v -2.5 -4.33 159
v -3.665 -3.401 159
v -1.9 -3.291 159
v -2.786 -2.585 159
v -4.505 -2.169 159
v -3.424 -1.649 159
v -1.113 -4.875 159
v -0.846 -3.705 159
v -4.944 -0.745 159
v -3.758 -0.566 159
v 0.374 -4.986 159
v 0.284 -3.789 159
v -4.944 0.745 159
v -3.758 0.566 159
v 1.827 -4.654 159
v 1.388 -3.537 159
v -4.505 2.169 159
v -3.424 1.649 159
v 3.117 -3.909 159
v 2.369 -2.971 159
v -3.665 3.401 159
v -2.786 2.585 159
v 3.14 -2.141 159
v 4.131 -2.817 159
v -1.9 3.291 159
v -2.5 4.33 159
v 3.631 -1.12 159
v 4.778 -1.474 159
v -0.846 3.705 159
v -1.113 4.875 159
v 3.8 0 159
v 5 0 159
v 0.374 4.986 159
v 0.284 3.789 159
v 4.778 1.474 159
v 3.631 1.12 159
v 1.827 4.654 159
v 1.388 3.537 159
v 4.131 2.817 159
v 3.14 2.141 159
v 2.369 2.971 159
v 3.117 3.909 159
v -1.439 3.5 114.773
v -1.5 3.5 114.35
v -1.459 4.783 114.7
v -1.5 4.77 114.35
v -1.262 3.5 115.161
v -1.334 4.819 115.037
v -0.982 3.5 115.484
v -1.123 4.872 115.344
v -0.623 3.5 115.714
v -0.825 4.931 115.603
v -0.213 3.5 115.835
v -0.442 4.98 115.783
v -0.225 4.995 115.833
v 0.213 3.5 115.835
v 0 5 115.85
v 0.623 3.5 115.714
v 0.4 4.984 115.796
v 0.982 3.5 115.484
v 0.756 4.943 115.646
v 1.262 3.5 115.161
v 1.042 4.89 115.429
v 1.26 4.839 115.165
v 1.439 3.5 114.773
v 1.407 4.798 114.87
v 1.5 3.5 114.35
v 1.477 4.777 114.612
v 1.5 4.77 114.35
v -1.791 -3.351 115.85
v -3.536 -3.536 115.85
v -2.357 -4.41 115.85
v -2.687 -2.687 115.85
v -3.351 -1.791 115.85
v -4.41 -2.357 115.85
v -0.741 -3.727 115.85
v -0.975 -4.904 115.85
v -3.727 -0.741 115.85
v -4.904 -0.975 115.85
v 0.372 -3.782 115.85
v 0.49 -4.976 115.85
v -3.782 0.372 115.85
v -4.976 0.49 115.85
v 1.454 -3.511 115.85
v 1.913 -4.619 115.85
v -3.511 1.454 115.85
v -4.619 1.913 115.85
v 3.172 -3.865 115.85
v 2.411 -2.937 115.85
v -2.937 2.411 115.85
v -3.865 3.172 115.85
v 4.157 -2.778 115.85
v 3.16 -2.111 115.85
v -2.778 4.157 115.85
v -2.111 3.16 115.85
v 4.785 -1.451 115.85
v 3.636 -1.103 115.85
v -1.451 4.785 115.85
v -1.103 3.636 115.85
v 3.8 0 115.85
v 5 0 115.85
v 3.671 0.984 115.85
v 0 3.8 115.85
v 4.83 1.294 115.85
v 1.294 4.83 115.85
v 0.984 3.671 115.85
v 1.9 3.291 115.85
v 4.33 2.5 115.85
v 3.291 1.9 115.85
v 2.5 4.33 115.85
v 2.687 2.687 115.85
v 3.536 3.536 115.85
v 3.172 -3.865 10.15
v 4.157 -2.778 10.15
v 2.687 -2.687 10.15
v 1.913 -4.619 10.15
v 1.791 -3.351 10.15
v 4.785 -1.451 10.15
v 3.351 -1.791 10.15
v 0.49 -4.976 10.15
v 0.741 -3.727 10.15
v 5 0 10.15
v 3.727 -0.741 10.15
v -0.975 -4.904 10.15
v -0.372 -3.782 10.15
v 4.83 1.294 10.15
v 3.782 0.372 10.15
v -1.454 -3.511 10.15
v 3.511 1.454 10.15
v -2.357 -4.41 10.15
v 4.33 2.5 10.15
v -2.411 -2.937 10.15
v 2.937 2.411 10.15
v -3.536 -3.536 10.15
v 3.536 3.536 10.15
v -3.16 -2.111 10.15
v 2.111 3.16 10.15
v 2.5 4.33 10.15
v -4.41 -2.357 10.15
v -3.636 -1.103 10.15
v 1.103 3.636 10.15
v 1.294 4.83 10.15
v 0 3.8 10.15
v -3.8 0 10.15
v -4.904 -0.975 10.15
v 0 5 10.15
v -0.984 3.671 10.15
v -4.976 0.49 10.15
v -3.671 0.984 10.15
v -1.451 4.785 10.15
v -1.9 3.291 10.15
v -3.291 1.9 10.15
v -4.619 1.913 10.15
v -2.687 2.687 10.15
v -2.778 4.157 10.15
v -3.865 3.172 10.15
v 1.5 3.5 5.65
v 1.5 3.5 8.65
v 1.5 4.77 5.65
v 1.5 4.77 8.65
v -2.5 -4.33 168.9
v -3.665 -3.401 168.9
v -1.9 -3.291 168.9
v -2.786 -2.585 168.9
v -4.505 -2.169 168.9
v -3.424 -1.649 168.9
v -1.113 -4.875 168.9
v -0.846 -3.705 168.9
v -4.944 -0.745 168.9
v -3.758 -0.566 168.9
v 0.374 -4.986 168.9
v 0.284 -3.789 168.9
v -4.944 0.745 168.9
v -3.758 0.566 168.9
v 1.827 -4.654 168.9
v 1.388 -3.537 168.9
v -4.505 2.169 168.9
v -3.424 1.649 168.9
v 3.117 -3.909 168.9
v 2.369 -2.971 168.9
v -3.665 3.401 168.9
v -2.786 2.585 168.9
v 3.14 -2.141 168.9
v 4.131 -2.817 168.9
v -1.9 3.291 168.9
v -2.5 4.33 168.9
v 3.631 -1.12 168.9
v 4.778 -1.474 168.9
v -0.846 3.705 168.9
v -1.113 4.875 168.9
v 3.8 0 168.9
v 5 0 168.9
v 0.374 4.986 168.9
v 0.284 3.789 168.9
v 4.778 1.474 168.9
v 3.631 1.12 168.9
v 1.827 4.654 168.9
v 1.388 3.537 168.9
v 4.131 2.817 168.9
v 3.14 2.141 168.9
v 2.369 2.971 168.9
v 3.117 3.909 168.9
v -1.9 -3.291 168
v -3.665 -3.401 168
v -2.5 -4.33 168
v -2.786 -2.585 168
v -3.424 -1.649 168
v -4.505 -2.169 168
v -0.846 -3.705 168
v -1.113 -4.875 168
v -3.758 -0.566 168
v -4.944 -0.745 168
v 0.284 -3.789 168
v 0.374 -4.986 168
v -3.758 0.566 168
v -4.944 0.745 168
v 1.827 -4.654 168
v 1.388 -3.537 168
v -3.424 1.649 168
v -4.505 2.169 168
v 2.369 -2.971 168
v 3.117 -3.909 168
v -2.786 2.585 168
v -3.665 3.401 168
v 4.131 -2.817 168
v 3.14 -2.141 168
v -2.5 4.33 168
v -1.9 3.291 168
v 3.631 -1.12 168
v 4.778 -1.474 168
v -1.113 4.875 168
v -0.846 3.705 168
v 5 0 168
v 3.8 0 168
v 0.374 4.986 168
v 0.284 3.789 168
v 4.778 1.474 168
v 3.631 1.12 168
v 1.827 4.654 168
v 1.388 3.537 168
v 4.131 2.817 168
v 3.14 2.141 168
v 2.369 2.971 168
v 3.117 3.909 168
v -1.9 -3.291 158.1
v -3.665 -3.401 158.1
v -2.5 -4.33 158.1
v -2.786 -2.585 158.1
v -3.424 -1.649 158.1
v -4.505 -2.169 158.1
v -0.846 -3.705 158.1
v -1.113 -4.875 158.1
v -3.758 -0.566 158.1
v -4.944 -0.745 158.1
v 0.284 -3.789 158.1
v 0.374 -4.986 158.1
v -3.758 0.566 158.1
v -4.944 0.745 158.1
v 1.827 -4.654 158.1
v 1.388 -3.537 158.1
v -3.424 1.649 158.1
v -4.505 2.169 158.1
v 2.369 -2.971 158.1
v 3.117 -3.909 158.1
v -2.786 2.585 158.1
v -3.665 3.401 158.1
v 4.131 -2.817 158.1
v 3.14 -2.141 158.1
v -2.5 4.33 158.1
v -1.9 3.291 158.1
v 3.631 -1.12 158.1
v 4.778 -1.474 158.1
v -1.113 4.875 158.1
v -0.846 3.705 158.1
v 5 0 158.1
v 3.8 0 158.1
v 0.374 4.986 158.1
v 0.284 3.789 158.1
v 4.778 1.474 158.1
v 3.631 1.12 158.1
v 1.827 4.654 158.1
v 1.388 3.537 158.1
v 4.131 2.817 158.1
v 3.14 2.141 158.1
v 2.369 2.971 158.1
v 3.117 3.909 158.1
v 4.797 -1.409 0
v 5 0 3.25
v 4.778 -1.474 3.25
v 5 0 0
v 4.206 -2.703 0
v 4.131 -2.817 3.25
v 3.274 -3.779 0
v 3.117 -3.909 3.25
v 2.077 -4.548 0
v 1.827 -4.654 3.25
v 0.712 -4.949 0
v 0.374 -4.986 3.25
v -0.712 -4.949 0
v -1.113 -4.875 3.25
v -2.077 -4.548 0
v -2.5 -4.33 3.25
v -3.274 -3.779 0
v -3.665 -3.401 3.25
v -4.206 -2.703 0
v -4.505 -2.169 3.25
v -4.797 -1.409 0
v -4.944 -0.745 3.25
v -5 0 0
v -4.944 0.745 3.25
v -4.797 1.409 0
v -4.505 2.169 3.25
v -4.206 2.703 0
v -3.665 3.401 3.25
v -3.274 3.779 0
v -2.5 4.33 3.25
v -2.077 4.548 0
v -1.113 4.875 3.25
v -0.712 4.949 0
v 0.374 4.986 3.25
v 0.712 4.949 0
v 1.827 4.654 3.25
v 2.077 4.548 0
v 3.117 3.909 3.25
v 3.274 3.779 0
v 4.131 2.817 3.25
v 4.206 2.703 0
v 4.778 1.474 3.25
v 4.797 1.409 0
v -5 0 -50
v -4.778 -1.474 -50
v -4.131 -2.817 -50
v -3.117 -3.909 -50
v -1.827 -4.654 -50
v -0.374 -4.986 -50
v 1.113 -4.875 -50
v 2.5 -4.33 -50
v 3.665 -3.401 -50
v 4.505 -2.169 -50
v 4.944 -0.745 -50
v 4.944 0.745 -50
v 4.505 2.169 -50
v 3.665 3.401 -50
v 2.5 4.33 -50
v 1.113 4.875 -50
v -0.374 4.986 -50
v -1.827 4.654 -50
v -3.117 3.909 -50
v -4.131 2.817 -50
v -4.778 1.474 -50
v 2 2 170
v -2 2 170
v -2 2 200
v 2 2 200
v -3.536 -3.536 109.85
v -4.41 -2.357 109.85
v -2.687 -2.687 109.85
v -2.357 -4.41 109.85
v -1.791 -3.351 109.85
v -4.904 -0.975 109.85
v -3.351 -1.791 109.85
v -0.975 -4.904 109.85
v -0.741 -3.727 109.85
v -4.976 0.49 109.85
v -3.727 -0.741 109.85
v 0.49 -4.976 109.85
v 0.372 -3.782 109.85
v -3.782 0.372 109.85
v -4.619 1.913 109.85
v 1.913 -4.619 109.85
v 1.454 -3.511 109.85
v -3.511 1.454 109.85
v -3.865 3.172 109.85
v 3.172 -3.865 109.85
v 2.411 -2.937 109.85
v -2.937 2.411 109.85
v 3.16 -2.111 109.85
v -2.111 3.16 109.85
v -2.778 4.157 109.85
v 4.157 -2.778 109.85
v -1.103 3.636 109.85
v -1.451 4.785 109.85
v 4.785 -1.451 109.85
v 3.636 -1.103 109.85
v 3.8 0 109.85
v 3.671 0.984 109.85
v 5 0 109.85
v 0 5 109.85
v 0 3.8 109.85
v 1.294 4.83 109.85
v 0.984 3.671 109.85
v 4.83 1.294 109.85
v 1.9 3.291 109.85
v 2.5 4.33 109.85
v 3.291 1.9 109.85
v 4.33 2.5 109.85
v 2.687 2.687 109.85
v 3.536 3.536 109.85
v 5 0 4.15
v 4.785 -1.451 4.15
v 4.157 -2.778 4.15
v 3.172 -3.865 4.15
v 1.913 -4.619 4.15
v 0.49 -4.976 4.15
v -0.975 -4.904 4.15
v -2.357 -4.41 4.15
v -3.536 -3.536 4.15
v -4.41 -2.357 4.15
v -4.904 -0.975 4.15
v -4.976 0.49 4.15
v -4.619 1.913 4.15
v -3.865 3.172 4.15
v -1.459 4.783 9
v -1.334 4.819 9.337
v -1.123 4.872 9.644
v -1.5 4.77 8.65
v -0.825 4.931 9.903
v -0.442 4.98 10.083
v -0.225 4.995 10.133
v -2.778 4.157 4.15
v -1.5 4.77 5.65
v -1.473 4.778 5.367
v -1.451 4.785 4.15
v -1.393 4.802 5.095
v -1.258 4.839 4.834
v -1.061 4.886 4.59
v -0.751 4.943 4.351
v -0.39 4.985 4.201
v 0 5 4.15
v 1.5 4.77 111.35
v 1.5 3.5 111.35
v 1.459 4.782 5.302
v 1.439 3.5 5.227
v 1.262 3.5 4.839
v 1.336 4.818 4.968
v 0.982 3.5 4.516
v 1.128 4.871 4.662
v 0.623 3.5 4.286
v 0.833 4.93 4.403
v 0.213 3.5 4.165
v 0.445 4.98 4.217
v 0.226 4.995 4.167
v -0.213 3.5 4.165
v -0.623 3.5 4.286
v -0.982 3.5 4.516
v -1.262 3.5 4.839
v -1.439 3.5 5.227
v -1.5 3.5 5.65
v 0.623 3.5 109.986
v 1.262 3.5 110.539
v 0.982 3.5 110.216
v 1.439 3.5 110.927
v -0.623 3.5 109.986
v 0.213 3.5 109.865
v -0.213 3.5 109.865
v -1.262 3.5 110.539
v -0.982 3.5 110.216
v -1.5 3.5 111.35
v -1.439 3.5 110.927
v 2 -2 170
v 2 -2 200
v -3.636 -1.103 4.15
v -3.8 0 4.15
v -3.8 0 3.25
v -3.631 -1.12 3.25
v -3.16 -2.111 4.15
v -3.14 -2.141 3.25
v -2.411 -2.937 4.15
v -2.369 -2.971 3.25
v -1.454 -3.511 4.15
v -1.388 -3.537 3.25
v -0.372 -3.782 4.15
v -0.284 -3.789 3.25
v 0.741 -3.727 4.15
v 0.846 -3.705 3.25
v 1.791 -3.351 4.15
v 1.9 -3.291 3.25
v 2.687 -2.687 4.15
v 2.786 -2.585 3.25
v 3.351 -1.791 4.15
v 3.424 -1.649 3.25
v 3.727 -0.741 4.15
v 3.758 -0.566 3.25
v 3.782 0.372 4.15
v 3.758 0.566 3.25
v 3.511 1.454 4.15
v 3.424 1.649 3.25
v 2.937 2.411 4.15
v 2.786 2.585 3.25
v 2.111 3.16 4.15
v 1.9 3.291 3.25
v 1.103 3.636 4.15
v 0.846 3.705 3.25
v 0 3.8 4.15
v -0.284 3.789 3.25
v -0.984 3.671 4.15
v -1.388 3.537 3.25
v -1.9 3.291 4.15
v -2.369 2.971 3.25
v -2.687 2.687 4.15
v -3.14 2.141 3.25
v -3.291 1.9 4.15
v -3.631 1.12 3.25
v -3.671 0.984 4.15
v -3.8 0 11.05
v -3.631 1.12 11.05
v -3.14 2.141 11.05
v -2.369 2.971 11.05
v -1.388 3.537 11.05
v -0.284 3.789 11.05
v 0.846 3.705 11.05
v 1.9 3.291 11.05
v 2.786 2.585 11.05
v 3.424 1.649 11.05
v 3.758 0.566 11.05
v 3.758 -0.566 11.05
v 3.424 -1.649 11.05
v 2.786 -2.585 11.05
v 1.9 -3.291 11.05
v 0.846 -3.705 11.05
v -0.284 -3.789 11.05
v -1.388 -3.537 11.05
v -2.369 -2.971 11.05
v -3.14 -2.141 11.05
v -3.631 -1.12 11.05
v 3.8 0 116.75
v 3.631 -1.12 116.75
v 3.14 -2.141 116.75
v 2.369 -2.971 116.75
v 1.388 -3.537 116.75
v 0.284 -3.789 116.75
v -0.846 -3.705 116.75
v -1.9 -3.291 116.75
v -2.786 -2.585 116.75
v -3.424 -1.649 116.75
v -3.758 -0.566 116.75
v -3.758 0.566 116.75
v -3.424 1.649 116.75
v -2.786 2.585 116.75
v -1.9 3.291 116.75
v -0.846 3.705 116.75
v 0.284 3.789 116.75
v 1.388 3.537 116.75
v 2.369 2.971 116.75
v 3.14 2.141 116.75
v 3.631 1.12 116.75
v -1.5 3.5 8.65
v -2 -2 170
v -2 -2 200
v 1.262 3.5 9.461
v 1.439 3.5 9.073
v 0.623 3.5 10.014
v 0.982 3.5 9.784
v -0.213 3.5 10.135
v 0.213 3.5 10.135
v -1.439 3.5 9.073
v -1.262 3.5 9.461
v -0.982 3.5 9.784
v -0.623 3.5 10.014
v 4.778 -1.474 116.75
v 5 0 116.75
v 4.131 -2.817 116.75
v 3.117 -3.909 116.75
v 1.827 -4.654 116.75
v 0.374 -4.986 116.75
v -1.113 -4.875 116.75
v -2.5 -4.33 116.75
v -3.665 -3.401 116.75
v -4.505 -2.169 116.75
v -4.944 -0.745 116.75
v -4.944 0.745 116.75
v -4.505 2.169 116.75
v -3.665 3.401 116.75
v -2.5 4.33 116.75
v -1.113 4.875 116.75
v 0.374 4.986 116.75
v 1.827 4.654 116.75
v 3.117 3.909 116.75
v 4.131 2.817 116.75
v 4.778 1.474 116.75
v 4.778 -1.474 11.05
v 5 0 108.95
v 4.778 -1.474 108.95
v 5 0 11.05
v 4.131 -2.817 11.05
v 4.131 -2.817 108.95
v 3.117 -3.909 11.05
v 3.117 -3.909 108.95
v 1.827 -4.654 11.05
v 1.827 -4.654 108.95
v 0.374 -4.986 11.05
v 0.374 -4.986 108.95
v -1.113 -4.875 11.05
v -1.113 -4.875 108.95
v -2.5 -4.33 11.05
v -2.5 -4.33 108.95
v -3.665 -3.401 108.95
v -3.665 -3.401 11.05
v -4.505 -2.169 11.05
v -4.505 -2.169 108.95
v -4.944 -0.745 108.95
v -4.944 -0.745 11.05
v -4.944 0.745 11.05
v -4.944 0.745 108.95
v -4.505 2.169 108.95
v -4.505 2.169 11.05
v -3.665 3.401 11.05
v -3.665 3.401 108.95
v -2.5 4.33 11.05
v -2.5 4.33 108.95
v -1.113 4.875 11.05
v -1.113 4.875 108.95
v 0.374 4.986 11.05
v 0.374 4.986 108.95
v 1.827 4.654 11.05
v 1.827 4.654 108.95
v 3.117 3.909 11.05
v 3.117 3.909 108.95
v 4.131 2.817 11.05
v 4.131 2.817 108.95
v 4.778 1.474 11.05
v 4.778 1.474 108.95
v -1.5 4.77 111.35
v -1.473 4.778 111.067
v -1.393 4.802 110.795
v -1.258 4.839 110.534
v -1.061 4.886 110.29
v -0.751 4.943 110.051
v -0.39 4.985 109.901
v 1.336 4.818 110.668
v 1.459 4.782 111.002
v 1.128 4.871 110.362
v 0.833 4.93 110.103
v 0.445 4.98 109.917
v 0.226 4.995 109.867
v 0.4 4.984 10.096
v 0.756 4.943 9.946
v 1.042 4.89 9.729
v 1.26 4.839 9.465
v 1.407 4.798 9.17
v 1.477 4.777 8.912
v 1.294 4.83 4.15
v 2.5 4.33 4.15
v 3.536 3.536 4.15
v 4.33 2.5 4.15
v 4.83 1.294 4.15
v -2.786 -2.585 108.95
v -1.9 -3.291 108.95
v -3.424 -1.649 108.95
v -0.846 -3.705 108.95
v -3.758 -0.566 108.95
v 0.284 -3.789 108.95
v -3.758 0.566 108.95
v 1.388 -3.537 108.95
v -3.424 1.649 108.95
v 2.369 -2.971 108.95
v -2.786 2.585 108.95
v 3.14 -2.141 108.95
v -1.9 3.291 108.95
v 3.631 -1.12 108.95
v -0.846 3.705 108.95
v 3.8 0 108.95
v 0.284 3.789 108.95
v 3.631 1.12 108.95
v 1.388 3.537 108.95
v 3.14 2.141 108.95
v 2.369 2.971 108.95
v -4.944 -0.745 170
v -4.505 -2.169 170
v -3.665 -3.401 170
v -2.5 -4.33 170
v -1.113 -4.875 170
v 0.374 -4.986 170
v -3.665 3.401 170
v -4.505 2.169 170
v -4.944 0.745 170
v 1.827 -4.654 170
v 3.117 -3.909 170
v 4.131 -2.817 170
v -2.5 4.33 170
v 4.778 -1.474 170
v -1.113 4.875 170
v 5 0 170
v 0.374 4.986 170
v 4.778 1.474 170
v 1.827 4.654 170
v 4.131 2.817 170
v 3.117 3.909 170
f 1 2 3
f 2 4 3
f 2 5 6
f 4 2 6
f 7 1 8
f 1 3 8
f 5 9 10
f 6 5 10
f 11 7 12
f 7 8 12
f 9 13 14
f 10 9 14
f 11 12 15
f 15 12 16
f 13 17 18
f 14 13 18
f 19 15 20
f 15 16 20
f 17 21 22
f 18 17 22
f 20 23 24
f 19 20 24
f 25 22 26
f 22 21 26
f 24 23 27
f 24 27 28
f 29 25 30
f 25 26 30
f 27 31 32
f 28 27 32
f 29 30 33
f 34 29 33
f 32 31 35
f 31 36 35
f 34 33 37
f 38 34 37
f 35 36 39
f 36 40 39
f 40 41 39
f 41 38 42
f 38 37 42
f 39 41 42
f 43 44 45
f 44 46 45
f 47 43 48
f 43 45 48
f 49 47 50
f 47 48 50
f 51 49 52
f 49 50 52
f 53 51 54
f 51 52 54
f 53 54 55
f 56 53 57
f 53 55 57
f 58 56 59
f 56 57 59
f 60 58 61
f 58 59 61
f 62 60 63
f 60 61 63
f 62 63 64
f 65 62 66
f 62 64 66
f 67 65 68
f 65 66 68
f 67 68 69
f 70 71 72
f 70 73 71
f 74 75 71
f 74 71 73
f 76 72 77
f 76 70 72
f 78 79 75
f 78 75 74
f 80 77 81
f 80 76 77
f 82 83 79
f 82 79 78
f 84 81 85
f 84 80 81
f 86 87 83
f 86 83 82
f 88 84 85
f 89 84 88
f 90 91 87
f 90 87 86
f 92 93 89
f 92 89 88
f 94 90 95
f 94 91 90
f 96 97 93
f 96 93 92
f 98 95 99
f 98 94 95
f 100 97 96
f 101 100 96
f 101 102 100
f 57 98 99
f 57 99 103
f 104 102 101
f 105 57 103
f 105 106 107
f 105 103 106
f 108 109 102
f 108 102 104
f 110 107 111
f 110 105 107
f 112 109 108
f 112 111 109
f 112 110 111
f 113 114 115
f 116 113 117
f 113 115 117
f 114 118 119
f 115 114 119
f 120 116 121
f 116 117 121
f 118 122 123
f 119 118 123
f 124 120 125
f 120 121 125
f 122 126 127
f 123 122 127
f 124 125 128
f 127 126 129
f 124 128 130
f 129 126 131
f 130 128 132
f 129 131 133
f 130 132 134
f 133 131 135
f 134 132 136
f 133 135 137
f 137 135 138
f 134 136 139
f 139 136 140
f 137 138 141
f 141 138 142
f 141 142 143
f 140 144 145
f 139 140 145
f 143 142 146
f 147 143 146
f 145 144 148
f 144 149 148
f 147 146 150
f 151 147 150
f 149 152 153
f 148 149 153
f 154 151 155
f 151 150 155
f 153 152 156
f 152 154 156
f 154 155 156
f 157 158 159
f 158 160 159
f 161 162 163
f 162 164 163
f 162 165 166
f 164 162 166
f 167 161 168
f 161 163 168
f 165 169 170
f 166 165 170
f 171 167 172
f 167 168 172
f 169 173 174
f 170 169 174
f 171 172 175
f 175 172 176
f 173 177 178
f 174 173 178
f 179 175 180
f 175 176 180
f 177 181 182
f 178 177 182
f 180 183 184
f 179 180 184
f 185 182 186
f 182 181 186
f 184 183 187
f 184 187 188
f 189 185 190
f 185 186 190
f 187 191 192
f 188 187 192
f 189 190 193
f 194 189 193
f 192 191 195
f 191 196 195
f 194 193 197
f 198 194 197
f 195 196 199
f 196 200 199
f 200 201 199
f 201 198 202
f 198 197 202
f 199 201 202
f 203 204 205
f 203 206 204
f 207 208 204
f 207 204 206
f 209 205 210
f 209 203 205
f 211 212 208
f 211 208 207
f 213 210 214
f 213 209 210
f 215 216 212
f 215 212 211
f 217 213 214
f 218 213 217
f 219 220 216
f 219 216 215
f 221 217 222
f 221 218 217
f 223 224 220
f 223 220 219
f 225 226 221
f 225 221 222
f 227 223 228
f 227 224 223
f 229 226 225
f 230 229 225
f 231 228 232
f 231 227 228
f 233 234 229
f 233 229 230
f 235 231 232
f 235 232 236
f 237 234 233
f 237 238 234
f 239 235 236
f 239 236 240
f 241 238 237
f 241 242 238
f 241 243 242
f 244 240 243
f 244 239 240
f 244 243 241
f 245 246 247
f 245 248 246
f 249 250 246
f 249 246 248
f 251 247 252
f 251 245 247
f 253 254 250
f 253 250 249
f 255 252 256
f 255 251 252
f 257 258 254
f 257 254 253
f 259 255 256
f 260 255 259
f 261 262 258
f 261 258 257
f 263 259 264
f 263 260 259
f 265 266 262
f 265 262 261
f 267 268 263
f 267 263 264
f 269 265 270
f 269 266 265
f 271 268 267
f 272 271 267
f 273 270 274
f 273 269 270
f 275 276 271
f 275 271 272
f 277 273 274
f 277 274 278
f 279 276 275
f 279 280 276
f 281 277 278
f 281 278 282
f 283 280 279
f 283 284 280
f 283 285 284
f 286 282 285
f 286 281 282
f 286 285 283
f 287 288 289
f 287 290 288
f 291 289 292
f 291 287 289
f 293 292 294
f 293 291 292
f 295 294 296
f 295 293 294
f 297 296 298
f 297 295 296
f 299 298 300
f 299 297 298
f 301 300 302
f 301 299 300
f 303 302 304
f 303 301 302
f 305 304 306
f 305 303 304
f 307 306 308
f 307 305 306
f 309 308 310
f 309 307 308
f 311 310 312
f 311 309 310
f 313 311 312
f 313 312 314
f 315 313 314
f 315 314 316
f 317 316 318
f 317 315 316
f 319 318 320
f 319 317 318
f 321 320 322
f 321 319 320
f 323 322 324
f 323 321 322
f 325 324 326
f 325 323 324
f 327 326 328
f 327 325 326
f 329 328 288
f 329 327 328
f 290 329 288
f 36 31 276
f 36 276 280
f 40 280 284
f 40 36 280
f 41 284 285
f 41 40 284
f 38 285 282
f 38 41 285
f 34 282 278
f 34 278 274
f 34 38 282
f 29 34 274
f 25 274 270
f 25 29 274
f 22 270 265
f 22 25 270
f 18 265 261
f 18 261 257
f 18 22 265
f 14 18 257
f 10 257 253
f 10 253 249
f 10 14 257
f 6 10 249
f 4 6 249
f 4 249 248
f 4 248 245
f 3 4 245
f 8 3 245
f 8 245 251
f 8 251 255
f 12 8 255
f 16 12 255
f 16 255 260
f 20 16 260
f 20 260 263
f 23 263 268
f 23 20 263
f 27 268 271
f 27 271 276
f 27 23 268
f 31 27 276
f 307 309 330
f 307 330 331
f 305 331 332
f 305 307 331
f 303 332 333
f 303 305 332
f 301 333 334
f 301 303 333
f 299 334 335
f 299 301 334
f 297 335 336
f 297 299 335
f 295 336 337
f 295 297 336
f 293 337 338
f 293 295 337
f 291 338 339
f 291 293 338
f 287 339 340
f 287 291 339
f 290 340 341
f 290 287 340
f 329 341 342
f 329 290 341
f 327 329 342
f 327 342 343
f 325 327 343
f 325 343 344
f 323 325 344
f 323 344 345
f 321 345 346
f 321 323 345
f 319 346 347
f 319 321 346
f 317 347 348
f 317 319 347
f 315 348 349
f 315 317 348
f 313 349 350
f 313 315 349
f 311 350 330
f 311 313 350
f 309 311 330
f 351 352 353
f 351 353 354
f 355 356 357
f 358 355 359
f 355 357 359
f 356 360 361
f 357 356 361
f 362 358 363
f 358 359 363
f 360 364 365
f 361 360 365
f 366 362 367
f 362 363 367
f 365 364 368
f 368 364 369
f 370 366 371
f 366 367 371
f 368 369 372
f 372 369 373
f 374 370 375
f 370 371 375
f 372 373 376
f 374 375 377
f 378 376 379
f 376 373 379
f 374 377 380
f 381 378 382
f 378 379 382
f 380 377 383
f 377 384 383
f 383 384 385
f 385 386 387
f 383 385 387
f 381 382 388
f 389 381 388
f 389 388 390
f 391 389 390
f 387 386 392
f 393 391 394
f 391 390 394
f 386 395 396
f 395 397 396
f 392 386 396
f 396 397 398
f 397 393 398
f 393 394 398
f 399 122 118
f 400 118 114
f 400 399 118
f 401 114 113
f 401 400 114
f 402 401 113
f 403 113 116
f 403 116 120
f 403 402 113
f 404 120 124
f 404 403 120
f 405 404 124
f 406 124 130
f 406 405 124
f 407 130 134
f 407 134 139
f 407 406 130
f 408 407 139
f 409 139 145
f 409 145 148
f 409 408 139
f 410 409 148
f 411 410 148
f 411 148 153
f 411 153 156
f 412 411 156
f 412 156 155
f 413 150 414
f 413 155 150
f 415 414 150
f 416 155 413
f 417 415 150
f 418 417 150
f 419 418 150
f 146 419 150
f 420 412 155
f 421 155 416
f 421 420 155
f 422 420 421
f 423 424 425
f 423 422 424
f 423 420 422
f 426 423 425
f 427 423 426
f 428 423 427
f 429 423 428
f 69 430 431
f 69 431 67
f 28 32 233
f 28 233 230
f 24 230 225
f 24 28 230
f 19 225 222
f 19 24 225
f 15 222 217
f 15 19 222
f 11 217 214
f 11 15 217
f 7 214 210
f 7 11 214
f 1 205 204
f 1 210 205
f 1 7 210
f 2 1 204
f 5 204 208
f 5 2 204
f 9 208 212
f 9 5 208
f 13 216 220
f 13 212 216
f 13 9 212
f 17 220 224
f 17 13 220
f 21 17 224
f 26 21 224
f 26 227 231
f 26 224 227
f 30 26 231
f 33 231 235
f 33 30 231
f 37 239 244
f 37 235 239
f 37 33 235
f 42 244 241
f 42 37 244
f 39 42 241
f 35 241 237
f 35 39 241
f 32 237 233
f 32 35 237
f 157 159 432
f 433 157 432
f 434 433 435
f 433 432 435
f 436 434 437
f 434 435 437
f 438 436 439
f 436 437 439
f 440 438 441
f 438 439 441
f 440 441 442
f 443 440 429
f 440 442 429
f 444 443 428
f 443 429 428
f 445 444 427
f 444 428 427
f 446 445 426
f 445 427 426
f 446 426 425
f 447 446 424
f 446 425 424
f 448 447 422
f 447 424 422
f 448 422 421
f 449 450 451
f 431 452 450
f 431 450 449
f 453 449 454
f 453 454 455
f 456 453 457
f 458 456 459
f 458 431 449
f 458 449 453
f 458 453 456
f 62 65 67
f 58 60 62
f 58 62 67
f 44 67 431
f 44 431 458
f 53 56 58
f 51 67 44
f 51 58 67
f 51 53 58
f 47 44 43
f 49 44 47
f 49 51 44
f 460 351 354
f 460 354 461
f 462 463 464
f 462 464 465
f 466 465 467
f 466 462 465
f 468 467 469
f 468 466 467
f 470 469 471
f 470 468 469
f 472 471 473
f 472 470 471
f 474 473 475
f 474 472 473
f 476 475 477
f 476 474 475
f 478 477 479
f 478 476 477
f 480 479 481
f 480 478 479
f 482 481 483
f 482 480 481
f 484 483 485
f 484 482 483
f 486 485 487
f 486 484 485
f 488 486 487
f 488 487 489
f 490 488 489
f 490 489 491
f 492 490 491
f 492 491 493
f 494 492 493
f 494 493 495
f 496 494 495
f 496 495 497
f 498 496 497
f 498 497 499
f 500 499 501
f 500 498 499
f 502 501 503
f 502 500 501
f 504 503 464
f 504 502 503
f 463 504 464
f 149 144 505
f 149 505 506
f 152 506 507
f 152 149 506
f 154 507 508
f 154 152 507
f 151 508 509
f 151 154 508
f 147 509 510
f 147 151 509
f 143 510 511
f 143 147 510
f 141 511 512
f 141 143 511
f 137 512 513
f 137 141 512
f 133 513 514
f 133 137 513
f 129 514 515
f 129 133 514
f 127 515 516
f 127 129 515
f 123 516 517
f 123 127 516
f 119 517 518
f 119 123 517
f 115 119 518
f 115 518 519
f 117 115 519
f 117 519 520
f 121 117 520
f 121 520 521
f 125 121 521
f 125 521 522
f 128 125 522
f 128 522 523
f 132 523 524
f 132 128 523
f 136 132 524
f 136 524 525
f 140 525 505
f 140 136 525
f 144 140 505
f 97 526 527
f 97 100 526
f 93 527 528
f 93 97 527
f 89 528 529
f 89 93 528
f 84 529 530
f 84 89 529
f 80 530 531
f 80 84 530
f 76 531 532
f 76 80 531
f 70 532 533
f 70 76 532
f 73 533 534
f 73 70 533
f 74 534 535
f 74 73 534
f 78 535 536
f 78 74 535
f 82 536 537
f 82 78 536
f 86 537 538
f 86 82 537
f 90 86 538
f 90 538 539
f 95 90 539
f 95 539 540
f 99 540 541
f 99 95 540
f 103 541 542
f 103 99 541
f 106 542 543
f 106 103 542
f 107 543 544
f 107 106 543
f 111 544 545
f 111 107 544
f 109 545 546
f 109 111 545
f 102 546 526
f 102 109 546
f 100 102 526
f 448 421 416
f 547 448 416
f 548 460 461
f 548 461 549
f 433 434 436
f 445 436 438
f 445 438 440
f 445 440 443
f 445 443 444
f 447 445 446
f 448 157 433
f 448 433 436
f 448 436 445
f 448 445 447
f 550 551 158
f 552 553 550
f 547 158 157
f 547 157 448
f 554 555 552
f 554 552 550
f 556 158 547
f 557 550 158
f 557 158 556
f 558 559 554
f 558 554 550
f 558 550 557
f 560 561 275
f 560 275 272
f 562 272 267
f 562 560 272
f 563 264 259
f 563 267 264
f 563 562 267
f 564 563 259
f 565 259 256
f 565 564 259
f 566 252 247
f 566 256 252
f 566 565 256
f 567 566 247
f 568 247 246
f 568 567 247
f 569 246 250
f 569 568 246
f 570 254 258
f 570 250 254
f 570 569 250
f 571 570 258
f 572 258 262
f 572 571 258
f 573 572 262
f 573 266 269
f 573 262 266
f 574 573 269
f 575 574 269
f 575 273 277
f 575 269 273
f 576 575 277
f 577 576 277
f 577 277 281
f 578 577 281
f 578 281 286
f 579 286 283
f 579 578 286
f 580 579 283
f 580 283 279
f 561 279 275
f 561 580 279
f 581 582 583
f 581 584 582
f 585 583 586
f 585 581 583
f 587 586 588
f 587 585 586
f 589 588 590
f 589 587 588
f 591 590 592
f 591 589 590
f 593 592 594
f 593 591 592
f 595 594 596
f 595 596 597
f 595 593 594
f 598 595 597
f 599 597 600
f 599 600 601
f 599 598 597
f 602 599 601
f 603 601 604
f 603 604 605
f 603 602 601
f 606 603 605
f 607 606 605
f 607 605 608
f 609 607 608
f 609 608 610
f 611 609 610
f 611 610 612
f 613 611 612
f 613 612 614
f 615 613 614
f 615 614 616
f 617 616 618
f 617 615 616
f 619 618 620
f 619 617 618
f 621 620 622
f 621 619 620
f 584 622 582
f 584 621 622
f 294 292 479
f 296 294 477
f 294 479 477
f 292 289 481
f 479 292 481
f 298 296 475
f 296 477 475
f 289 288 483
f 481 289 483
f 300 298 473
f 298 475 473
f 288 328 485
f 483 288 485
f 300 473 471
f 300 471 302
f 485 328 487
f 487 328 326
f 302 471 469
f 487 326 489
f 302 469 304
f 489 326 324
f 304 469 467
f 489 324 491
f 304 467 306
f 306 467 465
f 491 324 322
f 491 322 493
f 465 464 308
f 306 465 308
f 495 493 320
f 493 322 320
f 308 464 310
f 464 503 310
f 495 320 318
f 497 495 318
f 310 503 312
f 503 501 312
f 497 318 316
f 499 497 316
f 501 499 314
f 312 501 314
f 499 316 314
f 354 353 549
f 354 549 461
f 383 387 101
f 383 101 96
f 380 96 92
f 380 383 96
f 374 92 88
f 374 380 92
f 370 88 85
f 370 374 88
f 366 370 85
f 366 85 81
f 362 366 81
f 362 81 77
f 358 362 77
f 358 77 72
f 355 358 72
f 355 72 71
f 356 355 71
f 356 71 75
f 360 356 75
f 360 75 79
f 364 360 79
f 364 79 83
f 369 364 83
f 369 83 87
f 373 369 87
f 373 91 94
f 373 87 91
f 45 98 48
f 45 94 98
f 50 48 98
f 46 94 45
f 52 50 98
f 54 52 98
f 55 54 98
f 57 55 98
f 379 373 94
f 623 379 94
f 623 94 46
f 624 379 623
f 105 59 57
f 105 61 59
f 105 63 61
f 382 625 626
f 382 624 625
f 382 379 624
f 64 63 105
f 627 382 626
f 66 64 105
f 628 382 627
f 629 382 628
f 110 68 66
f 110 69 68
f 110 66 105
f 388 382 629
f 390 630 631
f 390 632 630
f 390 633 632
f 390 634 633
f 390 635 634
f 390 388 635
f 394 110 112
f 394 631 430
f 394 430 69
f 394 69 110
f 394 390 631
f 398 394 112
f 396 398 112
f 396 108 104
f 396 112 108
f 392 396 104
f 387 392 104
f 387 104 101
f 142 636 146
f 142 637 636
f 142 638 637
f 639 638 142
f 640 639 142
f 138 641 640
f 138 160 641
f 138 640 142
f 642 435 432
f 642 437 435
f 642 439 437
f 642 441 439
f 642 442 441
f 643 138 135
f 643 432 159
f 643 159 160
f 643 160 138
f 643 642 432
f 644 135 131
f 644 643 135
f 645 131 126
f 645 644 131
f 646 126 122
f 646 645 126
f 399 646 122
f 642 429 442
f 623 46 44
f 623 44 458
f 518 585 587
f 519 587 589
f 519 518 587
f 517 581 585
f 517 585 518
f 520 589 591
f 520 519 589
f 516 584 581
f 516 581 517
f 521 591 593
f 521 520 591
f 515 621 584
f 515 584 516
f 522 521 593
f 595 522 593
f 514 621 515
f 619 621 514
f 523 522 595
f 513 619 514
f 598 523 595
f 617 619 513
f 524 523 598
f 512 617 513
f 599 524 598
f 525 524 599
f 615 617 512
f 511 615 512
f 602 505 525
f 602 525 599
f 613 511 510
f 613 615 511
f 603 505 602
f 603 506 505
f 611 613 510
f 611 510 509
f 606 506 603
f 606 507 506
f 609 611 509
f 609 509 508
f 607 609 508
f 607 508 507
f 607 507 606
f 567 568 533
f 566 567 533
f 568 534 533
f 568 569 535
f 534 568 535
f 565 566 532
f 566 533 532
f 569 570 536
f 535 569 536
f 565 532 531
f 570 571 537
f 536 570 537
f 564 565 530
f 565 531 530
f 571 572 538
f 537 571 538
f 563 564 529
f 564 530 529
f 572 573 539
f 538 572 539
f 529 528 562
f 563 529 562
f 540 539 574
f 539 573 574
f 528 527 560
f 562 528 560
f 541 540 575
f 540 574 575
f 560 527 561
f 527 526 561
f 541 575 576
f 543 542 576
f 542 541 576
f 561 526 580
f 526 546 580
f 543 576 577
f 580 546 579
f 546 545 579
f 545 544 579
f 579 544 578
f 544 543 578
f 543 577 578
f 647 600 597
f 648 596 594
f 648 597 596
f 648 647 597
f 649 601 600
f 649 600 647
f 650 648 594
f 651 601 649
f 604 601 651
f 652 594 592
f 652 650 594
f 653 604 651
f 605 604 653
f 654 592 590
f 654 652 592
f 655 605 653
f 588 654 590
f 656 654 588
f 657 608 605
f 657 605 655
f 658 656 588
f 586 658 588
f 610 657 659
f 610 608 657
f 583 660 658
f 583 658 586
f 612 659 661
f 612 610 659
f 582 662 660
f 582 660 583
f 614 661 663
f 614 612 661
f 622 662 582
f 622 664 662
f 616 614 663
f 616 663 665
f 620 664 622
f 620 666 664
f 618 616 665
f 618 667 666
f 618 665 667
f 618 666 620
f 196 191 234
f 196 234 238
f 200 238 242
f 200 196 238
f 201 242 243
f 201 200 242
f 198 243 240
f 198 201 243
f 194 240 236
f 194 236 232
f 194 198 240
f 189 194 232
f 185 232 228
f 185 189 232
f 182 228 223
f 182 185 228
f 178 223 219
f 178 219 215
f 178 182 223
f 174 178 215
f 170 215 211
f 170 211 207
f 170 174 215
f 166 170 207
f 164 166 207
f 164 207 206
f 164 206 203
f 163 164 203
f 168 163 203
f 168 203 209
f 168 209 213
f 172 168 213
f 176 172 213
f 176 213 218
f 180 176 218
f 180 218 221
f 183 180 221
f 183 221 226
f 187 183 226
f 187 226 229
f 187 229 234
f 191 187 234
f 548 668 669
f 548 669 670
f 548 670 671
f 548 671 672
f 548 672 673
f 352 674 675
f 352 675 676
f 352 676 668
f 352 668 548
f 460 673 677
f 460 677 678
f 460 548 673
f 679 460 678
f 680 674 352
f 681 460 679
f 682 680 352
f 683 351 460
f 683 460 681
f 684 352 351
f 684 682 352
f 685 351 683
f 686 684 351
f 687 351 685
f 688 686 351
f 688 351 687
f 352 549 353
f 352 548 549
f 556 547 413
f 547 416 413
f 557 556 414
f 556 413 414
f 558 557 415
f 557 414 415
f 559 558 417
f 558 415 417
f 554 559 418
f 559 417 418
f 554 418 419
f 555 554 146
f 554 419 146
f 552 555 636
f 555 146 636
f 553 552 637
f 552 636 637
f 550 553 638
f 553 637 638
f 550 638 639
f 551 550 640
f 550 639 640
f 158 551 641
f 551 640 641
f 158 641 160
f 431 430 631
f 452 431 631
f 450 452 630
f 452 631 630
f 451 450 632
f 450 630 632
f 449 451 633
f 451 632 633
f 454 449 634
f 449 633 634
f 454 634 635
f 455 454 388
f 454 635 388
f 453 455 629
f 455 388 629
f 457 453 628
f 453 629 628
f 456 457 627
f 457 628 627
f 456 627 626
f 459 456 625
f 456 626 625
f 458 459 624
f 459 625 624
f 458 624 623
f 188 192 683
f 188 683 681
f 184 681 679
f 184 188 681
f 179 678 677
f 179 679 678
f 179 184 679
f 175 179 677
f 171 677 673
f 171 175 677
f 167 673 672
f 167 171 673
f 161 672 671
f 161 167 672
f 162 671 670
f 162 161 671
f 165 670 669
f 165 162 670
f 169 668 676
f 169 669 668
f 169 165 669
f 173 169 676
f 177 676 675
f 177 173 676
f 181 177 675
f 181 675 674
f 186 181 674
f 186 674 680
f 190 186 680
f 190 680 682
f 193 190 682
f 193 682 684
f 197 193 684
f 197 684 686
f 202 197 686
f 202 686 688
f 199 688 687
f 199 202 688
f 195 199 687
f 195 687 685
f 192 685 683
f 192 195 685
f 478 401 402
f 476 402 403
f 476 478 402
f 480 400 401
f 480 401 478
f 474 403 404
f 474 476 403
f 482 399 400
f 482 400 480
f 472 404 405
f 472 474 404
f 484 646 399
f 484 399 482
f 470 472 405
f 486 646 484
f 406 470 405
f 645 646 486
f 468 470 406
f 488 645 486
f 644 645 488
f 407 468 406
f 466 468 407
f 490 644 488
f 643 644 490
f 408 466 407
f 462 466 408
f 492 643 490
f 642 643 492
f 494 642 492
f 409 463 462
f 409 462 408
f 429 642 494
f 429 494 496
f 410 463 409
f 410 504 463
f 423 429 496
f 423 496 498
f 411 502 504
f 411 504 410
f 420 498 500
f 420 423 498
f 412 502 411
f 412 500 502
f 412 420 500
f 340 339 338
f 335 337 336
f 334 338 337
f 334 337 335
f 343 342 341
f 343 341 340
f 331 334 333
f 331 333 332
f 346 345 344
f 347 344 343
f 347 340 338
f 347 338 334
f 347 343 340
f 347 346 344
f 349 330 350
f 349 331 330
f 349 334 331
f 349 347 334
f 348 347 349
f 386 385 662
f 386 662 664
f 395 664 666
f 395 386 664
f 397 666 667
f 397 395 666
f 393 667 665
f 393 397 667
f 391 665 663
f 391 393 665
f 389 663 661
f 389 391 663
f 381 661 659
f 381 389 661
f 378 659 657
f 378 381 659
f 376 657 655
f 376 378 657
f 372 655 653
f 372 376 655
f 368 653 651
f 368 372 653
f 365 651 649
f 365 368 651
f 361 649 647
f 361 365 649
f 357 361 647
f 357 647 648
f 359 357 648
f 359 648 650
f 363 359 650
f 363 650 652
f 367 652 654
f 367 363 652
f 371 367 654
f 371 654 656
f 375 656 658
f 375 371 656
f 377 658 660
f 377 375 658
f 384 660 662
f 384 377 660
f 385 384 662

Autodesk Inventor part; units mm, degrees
sketch "Skizze1" plane through (0, 0, 0) normal (0, 0, 1) x (1, 0, 0)
  circle A0 centre (0, 0) radius 5
  dimension "d0" = 10
extrude "Extrusion1" add sketch "Skizze1" along normal blind 140
sketch "Skizze4" plane through (0, 0, 0) normal (0, 0, -1) x (-1, 0, 0)
  circle A0 centre (0, 0) radius 5
  dimension "d15" = 10
extrude "Extrusion4" add sketch "Skizze4" along normal blind 50
sketch "Skizze5" plane through (0, 0, 140) normal (0, 0, 1) x (1, 0, 0)
  circle A0 centre (0, 0) radius 5
sketch "Skizze6" plane through (0, 0, 140) normal (0, 0, 1) x (1, 0, 0)
  point P0 (0, 0)
extrude "Extrusion5" add sketch "Skizze5" along normal blind 30
sketch "Skizze7" plane through (0, 0, 170) normal (0, 0, 1) x (1, 0, 0)
  line L0 (0, 0) -> (0, 2)
  line L1 (0, 2) -> (2, 2)
  line L2 (2, 2) -> (2, -2)
  line L3 (2, -2) -> (-2, -2)
  line L4 (-2, -2) -> (-2, 2)
  line L5 (-2, 2) -> (0, 2)
  dimension "d20" = 2
  dimension "d21" = 2
  dimension "d22" = 4
  dimension "d23" = 4
extrude "Extrusion6" add sketch "Skizze7" along normal blind 30
ref_plane "Arbeitsebene1" through (0, 5, 0) normal (0, 1, 0) x (-1, 0, 0)
sketch "Skizze8" plane through (0, 5, 0) normal (0, 1, 0) x (-1, 0, 0)
  line L0 (-5, -50) -> (5, -50) projected
  line L1 (0, -50) -> (0, 170)
  line L2 (5, 170) -> (-5, 170) projected
  line L3 (0, 170) -> (0, 60)
  line L4 (0, 60) -> (0, 112.85)
  line L5 (0, 60) -> (0, 7.15)
  line L6 (0, 8.65) -> (0, 5.65) construction
  line L7 (-1.5, 8.65) -> (-1.5, 5.65)
  line L8 (1.5, 5.65) -> (1.5, 8.65)
  arc A0 (1.5, 8.65) -> (-1.5, 8.65) centre (0, 8.65) ccw
  arc A1 (-1.5, 5.65) -> (1.5, 5.65) centre (0, 5.65) ccw
  line L9 (0, 111.35) -> (0, 114.35) construction
  line L10 (-1.5, 111.35) -> (-1.5, 114.35)
  line L11 (1.5, 114.35) -> (1.5, 111.35)
  arc A2 (-1.5, 111.35) -> (1.5, 111.35) centre (0, 111.35) ccw
  arc A3 (1.5, 114.35) -> (-1.5, 114.35) centre (0, 114.35) ccw
  point P0 (0, 0)
  dimension "d27" = 52.85
  dimension "d28" = 52.85
  dimension "d30" = 3
  dimension "d31" = 6
  dimension "d35" = 1.5
  dimension "d46" = 6
extrude "Extrusion7" cut sketch "Skizze8" against normal blind 1.5 contours A1 L7 A0 L1 | L1 A0 L8 A1
extrude "Extrusion8" cut sketch "Skizze8" against normal blind 1.5 contours A2 L10 A3 L1 | L1 A3 L11 A2
ref_plane "Arbeitsebene2" through (0, 5, 115.85) normal (0, 0, 1) x (1, 0, 0)
sketch "Skizze9" plane through (0, 5, 115.85) normal (0, 0, 1) x (1, 0, 0)
  circle A0 centre (0, -5) radius 3.8
  circle A1 centre (0, -5) radius 5
  point P0 (0, -5)
  dimension "d38" = 7.6
  dimension "d41" = 10
extrude "Extrusion9" cut sketch "Skizze9" along normal blind 0.9
ref_plane "Arbeitsebene3" through (0, 5, 4.15) normal (0, 0, -1) x (-1, 0, 0)
sketch "Skizze10" plane through (0, 5, 4.15) normal (0, 0, -1) x (-1, 0, 0)
  circle A0 centre (0, -5) radius 5
  circle A1 centre (0, -5) radius 3.8
  point P0 (0, -5)
  dimension "d42" = 7.6
extrude "Extrusion10" cut sketch "Skizze10" along normal blind 0.9
ref_plane "Arbeitsebene4" through (0, 5, 109.85) normal (0, 0, 1) x (1, 0, 0)
sketch "Skizze11" plane through (0, 5, 109.85) normal (0, 0, 1) x (1, 0, 0)
  circle A0 centre (0, -5) radius 5.4286
  circle A1 centre (0, -5) radius 3.8
  point P0 (0, -5)
  dimension "d48" = 7.6
extrude "Extrusion11" cut sketch "Skizze11" against normal blind 0.9
ref_plane "Arbeitsebene5" through (0, 5, 10.15) normal (0, 0, -1) x (-1, 0, 0)
sketch "Skizze12" plane through (0, 5, 10.15) normal (0, 0, -1) x (-1, 0, 0)
  circle A0 centre (0, -5) radius 5.0141
  circle A1 centre (0, -5) radius 3.8
  point P0 (0, -5)
  dimension "d52" = 7.6
extrude "Extrusion12" cut sketch "Skizze12" against normal blind 0.9
ref_plane "Arbeitsebene6" through (0, 0, 168.9) normal (0, 0, 1) x (1, 0, 0)
sketch "Skizze13" plane through (0, 0, 168.9) normal (0, 0, 1) x (1, 0, 0)
  circle A0 centre (0, 0) radius 3.8
  circle A1 centre (0, 0) radius 5
  dimension "d56" = 7.6
  dimension "d64" = 10
extrude "Extrusion13" cut sketch "Skizze13" against normal blind 0.9
ref_plane "Arbeitsebene7" through (0, 0, 159) normal (0, 0, 1) x (1, 0, 0)
sketch "Skizze14" plane through (0, 0, 159) normal (0, 0, 1) x (1, 0, 0)
  circle A0 centre (0, 0) radius 5
  circle A1 centre (0, 0) radius 3.8
  dimension "d60" = 10
  dimension "d61" = 7.6
extrude "Extrusion14" cut sketch "Skizze14" against normal blind 0.9
properties part number "Förderbandwelle_vorne"
